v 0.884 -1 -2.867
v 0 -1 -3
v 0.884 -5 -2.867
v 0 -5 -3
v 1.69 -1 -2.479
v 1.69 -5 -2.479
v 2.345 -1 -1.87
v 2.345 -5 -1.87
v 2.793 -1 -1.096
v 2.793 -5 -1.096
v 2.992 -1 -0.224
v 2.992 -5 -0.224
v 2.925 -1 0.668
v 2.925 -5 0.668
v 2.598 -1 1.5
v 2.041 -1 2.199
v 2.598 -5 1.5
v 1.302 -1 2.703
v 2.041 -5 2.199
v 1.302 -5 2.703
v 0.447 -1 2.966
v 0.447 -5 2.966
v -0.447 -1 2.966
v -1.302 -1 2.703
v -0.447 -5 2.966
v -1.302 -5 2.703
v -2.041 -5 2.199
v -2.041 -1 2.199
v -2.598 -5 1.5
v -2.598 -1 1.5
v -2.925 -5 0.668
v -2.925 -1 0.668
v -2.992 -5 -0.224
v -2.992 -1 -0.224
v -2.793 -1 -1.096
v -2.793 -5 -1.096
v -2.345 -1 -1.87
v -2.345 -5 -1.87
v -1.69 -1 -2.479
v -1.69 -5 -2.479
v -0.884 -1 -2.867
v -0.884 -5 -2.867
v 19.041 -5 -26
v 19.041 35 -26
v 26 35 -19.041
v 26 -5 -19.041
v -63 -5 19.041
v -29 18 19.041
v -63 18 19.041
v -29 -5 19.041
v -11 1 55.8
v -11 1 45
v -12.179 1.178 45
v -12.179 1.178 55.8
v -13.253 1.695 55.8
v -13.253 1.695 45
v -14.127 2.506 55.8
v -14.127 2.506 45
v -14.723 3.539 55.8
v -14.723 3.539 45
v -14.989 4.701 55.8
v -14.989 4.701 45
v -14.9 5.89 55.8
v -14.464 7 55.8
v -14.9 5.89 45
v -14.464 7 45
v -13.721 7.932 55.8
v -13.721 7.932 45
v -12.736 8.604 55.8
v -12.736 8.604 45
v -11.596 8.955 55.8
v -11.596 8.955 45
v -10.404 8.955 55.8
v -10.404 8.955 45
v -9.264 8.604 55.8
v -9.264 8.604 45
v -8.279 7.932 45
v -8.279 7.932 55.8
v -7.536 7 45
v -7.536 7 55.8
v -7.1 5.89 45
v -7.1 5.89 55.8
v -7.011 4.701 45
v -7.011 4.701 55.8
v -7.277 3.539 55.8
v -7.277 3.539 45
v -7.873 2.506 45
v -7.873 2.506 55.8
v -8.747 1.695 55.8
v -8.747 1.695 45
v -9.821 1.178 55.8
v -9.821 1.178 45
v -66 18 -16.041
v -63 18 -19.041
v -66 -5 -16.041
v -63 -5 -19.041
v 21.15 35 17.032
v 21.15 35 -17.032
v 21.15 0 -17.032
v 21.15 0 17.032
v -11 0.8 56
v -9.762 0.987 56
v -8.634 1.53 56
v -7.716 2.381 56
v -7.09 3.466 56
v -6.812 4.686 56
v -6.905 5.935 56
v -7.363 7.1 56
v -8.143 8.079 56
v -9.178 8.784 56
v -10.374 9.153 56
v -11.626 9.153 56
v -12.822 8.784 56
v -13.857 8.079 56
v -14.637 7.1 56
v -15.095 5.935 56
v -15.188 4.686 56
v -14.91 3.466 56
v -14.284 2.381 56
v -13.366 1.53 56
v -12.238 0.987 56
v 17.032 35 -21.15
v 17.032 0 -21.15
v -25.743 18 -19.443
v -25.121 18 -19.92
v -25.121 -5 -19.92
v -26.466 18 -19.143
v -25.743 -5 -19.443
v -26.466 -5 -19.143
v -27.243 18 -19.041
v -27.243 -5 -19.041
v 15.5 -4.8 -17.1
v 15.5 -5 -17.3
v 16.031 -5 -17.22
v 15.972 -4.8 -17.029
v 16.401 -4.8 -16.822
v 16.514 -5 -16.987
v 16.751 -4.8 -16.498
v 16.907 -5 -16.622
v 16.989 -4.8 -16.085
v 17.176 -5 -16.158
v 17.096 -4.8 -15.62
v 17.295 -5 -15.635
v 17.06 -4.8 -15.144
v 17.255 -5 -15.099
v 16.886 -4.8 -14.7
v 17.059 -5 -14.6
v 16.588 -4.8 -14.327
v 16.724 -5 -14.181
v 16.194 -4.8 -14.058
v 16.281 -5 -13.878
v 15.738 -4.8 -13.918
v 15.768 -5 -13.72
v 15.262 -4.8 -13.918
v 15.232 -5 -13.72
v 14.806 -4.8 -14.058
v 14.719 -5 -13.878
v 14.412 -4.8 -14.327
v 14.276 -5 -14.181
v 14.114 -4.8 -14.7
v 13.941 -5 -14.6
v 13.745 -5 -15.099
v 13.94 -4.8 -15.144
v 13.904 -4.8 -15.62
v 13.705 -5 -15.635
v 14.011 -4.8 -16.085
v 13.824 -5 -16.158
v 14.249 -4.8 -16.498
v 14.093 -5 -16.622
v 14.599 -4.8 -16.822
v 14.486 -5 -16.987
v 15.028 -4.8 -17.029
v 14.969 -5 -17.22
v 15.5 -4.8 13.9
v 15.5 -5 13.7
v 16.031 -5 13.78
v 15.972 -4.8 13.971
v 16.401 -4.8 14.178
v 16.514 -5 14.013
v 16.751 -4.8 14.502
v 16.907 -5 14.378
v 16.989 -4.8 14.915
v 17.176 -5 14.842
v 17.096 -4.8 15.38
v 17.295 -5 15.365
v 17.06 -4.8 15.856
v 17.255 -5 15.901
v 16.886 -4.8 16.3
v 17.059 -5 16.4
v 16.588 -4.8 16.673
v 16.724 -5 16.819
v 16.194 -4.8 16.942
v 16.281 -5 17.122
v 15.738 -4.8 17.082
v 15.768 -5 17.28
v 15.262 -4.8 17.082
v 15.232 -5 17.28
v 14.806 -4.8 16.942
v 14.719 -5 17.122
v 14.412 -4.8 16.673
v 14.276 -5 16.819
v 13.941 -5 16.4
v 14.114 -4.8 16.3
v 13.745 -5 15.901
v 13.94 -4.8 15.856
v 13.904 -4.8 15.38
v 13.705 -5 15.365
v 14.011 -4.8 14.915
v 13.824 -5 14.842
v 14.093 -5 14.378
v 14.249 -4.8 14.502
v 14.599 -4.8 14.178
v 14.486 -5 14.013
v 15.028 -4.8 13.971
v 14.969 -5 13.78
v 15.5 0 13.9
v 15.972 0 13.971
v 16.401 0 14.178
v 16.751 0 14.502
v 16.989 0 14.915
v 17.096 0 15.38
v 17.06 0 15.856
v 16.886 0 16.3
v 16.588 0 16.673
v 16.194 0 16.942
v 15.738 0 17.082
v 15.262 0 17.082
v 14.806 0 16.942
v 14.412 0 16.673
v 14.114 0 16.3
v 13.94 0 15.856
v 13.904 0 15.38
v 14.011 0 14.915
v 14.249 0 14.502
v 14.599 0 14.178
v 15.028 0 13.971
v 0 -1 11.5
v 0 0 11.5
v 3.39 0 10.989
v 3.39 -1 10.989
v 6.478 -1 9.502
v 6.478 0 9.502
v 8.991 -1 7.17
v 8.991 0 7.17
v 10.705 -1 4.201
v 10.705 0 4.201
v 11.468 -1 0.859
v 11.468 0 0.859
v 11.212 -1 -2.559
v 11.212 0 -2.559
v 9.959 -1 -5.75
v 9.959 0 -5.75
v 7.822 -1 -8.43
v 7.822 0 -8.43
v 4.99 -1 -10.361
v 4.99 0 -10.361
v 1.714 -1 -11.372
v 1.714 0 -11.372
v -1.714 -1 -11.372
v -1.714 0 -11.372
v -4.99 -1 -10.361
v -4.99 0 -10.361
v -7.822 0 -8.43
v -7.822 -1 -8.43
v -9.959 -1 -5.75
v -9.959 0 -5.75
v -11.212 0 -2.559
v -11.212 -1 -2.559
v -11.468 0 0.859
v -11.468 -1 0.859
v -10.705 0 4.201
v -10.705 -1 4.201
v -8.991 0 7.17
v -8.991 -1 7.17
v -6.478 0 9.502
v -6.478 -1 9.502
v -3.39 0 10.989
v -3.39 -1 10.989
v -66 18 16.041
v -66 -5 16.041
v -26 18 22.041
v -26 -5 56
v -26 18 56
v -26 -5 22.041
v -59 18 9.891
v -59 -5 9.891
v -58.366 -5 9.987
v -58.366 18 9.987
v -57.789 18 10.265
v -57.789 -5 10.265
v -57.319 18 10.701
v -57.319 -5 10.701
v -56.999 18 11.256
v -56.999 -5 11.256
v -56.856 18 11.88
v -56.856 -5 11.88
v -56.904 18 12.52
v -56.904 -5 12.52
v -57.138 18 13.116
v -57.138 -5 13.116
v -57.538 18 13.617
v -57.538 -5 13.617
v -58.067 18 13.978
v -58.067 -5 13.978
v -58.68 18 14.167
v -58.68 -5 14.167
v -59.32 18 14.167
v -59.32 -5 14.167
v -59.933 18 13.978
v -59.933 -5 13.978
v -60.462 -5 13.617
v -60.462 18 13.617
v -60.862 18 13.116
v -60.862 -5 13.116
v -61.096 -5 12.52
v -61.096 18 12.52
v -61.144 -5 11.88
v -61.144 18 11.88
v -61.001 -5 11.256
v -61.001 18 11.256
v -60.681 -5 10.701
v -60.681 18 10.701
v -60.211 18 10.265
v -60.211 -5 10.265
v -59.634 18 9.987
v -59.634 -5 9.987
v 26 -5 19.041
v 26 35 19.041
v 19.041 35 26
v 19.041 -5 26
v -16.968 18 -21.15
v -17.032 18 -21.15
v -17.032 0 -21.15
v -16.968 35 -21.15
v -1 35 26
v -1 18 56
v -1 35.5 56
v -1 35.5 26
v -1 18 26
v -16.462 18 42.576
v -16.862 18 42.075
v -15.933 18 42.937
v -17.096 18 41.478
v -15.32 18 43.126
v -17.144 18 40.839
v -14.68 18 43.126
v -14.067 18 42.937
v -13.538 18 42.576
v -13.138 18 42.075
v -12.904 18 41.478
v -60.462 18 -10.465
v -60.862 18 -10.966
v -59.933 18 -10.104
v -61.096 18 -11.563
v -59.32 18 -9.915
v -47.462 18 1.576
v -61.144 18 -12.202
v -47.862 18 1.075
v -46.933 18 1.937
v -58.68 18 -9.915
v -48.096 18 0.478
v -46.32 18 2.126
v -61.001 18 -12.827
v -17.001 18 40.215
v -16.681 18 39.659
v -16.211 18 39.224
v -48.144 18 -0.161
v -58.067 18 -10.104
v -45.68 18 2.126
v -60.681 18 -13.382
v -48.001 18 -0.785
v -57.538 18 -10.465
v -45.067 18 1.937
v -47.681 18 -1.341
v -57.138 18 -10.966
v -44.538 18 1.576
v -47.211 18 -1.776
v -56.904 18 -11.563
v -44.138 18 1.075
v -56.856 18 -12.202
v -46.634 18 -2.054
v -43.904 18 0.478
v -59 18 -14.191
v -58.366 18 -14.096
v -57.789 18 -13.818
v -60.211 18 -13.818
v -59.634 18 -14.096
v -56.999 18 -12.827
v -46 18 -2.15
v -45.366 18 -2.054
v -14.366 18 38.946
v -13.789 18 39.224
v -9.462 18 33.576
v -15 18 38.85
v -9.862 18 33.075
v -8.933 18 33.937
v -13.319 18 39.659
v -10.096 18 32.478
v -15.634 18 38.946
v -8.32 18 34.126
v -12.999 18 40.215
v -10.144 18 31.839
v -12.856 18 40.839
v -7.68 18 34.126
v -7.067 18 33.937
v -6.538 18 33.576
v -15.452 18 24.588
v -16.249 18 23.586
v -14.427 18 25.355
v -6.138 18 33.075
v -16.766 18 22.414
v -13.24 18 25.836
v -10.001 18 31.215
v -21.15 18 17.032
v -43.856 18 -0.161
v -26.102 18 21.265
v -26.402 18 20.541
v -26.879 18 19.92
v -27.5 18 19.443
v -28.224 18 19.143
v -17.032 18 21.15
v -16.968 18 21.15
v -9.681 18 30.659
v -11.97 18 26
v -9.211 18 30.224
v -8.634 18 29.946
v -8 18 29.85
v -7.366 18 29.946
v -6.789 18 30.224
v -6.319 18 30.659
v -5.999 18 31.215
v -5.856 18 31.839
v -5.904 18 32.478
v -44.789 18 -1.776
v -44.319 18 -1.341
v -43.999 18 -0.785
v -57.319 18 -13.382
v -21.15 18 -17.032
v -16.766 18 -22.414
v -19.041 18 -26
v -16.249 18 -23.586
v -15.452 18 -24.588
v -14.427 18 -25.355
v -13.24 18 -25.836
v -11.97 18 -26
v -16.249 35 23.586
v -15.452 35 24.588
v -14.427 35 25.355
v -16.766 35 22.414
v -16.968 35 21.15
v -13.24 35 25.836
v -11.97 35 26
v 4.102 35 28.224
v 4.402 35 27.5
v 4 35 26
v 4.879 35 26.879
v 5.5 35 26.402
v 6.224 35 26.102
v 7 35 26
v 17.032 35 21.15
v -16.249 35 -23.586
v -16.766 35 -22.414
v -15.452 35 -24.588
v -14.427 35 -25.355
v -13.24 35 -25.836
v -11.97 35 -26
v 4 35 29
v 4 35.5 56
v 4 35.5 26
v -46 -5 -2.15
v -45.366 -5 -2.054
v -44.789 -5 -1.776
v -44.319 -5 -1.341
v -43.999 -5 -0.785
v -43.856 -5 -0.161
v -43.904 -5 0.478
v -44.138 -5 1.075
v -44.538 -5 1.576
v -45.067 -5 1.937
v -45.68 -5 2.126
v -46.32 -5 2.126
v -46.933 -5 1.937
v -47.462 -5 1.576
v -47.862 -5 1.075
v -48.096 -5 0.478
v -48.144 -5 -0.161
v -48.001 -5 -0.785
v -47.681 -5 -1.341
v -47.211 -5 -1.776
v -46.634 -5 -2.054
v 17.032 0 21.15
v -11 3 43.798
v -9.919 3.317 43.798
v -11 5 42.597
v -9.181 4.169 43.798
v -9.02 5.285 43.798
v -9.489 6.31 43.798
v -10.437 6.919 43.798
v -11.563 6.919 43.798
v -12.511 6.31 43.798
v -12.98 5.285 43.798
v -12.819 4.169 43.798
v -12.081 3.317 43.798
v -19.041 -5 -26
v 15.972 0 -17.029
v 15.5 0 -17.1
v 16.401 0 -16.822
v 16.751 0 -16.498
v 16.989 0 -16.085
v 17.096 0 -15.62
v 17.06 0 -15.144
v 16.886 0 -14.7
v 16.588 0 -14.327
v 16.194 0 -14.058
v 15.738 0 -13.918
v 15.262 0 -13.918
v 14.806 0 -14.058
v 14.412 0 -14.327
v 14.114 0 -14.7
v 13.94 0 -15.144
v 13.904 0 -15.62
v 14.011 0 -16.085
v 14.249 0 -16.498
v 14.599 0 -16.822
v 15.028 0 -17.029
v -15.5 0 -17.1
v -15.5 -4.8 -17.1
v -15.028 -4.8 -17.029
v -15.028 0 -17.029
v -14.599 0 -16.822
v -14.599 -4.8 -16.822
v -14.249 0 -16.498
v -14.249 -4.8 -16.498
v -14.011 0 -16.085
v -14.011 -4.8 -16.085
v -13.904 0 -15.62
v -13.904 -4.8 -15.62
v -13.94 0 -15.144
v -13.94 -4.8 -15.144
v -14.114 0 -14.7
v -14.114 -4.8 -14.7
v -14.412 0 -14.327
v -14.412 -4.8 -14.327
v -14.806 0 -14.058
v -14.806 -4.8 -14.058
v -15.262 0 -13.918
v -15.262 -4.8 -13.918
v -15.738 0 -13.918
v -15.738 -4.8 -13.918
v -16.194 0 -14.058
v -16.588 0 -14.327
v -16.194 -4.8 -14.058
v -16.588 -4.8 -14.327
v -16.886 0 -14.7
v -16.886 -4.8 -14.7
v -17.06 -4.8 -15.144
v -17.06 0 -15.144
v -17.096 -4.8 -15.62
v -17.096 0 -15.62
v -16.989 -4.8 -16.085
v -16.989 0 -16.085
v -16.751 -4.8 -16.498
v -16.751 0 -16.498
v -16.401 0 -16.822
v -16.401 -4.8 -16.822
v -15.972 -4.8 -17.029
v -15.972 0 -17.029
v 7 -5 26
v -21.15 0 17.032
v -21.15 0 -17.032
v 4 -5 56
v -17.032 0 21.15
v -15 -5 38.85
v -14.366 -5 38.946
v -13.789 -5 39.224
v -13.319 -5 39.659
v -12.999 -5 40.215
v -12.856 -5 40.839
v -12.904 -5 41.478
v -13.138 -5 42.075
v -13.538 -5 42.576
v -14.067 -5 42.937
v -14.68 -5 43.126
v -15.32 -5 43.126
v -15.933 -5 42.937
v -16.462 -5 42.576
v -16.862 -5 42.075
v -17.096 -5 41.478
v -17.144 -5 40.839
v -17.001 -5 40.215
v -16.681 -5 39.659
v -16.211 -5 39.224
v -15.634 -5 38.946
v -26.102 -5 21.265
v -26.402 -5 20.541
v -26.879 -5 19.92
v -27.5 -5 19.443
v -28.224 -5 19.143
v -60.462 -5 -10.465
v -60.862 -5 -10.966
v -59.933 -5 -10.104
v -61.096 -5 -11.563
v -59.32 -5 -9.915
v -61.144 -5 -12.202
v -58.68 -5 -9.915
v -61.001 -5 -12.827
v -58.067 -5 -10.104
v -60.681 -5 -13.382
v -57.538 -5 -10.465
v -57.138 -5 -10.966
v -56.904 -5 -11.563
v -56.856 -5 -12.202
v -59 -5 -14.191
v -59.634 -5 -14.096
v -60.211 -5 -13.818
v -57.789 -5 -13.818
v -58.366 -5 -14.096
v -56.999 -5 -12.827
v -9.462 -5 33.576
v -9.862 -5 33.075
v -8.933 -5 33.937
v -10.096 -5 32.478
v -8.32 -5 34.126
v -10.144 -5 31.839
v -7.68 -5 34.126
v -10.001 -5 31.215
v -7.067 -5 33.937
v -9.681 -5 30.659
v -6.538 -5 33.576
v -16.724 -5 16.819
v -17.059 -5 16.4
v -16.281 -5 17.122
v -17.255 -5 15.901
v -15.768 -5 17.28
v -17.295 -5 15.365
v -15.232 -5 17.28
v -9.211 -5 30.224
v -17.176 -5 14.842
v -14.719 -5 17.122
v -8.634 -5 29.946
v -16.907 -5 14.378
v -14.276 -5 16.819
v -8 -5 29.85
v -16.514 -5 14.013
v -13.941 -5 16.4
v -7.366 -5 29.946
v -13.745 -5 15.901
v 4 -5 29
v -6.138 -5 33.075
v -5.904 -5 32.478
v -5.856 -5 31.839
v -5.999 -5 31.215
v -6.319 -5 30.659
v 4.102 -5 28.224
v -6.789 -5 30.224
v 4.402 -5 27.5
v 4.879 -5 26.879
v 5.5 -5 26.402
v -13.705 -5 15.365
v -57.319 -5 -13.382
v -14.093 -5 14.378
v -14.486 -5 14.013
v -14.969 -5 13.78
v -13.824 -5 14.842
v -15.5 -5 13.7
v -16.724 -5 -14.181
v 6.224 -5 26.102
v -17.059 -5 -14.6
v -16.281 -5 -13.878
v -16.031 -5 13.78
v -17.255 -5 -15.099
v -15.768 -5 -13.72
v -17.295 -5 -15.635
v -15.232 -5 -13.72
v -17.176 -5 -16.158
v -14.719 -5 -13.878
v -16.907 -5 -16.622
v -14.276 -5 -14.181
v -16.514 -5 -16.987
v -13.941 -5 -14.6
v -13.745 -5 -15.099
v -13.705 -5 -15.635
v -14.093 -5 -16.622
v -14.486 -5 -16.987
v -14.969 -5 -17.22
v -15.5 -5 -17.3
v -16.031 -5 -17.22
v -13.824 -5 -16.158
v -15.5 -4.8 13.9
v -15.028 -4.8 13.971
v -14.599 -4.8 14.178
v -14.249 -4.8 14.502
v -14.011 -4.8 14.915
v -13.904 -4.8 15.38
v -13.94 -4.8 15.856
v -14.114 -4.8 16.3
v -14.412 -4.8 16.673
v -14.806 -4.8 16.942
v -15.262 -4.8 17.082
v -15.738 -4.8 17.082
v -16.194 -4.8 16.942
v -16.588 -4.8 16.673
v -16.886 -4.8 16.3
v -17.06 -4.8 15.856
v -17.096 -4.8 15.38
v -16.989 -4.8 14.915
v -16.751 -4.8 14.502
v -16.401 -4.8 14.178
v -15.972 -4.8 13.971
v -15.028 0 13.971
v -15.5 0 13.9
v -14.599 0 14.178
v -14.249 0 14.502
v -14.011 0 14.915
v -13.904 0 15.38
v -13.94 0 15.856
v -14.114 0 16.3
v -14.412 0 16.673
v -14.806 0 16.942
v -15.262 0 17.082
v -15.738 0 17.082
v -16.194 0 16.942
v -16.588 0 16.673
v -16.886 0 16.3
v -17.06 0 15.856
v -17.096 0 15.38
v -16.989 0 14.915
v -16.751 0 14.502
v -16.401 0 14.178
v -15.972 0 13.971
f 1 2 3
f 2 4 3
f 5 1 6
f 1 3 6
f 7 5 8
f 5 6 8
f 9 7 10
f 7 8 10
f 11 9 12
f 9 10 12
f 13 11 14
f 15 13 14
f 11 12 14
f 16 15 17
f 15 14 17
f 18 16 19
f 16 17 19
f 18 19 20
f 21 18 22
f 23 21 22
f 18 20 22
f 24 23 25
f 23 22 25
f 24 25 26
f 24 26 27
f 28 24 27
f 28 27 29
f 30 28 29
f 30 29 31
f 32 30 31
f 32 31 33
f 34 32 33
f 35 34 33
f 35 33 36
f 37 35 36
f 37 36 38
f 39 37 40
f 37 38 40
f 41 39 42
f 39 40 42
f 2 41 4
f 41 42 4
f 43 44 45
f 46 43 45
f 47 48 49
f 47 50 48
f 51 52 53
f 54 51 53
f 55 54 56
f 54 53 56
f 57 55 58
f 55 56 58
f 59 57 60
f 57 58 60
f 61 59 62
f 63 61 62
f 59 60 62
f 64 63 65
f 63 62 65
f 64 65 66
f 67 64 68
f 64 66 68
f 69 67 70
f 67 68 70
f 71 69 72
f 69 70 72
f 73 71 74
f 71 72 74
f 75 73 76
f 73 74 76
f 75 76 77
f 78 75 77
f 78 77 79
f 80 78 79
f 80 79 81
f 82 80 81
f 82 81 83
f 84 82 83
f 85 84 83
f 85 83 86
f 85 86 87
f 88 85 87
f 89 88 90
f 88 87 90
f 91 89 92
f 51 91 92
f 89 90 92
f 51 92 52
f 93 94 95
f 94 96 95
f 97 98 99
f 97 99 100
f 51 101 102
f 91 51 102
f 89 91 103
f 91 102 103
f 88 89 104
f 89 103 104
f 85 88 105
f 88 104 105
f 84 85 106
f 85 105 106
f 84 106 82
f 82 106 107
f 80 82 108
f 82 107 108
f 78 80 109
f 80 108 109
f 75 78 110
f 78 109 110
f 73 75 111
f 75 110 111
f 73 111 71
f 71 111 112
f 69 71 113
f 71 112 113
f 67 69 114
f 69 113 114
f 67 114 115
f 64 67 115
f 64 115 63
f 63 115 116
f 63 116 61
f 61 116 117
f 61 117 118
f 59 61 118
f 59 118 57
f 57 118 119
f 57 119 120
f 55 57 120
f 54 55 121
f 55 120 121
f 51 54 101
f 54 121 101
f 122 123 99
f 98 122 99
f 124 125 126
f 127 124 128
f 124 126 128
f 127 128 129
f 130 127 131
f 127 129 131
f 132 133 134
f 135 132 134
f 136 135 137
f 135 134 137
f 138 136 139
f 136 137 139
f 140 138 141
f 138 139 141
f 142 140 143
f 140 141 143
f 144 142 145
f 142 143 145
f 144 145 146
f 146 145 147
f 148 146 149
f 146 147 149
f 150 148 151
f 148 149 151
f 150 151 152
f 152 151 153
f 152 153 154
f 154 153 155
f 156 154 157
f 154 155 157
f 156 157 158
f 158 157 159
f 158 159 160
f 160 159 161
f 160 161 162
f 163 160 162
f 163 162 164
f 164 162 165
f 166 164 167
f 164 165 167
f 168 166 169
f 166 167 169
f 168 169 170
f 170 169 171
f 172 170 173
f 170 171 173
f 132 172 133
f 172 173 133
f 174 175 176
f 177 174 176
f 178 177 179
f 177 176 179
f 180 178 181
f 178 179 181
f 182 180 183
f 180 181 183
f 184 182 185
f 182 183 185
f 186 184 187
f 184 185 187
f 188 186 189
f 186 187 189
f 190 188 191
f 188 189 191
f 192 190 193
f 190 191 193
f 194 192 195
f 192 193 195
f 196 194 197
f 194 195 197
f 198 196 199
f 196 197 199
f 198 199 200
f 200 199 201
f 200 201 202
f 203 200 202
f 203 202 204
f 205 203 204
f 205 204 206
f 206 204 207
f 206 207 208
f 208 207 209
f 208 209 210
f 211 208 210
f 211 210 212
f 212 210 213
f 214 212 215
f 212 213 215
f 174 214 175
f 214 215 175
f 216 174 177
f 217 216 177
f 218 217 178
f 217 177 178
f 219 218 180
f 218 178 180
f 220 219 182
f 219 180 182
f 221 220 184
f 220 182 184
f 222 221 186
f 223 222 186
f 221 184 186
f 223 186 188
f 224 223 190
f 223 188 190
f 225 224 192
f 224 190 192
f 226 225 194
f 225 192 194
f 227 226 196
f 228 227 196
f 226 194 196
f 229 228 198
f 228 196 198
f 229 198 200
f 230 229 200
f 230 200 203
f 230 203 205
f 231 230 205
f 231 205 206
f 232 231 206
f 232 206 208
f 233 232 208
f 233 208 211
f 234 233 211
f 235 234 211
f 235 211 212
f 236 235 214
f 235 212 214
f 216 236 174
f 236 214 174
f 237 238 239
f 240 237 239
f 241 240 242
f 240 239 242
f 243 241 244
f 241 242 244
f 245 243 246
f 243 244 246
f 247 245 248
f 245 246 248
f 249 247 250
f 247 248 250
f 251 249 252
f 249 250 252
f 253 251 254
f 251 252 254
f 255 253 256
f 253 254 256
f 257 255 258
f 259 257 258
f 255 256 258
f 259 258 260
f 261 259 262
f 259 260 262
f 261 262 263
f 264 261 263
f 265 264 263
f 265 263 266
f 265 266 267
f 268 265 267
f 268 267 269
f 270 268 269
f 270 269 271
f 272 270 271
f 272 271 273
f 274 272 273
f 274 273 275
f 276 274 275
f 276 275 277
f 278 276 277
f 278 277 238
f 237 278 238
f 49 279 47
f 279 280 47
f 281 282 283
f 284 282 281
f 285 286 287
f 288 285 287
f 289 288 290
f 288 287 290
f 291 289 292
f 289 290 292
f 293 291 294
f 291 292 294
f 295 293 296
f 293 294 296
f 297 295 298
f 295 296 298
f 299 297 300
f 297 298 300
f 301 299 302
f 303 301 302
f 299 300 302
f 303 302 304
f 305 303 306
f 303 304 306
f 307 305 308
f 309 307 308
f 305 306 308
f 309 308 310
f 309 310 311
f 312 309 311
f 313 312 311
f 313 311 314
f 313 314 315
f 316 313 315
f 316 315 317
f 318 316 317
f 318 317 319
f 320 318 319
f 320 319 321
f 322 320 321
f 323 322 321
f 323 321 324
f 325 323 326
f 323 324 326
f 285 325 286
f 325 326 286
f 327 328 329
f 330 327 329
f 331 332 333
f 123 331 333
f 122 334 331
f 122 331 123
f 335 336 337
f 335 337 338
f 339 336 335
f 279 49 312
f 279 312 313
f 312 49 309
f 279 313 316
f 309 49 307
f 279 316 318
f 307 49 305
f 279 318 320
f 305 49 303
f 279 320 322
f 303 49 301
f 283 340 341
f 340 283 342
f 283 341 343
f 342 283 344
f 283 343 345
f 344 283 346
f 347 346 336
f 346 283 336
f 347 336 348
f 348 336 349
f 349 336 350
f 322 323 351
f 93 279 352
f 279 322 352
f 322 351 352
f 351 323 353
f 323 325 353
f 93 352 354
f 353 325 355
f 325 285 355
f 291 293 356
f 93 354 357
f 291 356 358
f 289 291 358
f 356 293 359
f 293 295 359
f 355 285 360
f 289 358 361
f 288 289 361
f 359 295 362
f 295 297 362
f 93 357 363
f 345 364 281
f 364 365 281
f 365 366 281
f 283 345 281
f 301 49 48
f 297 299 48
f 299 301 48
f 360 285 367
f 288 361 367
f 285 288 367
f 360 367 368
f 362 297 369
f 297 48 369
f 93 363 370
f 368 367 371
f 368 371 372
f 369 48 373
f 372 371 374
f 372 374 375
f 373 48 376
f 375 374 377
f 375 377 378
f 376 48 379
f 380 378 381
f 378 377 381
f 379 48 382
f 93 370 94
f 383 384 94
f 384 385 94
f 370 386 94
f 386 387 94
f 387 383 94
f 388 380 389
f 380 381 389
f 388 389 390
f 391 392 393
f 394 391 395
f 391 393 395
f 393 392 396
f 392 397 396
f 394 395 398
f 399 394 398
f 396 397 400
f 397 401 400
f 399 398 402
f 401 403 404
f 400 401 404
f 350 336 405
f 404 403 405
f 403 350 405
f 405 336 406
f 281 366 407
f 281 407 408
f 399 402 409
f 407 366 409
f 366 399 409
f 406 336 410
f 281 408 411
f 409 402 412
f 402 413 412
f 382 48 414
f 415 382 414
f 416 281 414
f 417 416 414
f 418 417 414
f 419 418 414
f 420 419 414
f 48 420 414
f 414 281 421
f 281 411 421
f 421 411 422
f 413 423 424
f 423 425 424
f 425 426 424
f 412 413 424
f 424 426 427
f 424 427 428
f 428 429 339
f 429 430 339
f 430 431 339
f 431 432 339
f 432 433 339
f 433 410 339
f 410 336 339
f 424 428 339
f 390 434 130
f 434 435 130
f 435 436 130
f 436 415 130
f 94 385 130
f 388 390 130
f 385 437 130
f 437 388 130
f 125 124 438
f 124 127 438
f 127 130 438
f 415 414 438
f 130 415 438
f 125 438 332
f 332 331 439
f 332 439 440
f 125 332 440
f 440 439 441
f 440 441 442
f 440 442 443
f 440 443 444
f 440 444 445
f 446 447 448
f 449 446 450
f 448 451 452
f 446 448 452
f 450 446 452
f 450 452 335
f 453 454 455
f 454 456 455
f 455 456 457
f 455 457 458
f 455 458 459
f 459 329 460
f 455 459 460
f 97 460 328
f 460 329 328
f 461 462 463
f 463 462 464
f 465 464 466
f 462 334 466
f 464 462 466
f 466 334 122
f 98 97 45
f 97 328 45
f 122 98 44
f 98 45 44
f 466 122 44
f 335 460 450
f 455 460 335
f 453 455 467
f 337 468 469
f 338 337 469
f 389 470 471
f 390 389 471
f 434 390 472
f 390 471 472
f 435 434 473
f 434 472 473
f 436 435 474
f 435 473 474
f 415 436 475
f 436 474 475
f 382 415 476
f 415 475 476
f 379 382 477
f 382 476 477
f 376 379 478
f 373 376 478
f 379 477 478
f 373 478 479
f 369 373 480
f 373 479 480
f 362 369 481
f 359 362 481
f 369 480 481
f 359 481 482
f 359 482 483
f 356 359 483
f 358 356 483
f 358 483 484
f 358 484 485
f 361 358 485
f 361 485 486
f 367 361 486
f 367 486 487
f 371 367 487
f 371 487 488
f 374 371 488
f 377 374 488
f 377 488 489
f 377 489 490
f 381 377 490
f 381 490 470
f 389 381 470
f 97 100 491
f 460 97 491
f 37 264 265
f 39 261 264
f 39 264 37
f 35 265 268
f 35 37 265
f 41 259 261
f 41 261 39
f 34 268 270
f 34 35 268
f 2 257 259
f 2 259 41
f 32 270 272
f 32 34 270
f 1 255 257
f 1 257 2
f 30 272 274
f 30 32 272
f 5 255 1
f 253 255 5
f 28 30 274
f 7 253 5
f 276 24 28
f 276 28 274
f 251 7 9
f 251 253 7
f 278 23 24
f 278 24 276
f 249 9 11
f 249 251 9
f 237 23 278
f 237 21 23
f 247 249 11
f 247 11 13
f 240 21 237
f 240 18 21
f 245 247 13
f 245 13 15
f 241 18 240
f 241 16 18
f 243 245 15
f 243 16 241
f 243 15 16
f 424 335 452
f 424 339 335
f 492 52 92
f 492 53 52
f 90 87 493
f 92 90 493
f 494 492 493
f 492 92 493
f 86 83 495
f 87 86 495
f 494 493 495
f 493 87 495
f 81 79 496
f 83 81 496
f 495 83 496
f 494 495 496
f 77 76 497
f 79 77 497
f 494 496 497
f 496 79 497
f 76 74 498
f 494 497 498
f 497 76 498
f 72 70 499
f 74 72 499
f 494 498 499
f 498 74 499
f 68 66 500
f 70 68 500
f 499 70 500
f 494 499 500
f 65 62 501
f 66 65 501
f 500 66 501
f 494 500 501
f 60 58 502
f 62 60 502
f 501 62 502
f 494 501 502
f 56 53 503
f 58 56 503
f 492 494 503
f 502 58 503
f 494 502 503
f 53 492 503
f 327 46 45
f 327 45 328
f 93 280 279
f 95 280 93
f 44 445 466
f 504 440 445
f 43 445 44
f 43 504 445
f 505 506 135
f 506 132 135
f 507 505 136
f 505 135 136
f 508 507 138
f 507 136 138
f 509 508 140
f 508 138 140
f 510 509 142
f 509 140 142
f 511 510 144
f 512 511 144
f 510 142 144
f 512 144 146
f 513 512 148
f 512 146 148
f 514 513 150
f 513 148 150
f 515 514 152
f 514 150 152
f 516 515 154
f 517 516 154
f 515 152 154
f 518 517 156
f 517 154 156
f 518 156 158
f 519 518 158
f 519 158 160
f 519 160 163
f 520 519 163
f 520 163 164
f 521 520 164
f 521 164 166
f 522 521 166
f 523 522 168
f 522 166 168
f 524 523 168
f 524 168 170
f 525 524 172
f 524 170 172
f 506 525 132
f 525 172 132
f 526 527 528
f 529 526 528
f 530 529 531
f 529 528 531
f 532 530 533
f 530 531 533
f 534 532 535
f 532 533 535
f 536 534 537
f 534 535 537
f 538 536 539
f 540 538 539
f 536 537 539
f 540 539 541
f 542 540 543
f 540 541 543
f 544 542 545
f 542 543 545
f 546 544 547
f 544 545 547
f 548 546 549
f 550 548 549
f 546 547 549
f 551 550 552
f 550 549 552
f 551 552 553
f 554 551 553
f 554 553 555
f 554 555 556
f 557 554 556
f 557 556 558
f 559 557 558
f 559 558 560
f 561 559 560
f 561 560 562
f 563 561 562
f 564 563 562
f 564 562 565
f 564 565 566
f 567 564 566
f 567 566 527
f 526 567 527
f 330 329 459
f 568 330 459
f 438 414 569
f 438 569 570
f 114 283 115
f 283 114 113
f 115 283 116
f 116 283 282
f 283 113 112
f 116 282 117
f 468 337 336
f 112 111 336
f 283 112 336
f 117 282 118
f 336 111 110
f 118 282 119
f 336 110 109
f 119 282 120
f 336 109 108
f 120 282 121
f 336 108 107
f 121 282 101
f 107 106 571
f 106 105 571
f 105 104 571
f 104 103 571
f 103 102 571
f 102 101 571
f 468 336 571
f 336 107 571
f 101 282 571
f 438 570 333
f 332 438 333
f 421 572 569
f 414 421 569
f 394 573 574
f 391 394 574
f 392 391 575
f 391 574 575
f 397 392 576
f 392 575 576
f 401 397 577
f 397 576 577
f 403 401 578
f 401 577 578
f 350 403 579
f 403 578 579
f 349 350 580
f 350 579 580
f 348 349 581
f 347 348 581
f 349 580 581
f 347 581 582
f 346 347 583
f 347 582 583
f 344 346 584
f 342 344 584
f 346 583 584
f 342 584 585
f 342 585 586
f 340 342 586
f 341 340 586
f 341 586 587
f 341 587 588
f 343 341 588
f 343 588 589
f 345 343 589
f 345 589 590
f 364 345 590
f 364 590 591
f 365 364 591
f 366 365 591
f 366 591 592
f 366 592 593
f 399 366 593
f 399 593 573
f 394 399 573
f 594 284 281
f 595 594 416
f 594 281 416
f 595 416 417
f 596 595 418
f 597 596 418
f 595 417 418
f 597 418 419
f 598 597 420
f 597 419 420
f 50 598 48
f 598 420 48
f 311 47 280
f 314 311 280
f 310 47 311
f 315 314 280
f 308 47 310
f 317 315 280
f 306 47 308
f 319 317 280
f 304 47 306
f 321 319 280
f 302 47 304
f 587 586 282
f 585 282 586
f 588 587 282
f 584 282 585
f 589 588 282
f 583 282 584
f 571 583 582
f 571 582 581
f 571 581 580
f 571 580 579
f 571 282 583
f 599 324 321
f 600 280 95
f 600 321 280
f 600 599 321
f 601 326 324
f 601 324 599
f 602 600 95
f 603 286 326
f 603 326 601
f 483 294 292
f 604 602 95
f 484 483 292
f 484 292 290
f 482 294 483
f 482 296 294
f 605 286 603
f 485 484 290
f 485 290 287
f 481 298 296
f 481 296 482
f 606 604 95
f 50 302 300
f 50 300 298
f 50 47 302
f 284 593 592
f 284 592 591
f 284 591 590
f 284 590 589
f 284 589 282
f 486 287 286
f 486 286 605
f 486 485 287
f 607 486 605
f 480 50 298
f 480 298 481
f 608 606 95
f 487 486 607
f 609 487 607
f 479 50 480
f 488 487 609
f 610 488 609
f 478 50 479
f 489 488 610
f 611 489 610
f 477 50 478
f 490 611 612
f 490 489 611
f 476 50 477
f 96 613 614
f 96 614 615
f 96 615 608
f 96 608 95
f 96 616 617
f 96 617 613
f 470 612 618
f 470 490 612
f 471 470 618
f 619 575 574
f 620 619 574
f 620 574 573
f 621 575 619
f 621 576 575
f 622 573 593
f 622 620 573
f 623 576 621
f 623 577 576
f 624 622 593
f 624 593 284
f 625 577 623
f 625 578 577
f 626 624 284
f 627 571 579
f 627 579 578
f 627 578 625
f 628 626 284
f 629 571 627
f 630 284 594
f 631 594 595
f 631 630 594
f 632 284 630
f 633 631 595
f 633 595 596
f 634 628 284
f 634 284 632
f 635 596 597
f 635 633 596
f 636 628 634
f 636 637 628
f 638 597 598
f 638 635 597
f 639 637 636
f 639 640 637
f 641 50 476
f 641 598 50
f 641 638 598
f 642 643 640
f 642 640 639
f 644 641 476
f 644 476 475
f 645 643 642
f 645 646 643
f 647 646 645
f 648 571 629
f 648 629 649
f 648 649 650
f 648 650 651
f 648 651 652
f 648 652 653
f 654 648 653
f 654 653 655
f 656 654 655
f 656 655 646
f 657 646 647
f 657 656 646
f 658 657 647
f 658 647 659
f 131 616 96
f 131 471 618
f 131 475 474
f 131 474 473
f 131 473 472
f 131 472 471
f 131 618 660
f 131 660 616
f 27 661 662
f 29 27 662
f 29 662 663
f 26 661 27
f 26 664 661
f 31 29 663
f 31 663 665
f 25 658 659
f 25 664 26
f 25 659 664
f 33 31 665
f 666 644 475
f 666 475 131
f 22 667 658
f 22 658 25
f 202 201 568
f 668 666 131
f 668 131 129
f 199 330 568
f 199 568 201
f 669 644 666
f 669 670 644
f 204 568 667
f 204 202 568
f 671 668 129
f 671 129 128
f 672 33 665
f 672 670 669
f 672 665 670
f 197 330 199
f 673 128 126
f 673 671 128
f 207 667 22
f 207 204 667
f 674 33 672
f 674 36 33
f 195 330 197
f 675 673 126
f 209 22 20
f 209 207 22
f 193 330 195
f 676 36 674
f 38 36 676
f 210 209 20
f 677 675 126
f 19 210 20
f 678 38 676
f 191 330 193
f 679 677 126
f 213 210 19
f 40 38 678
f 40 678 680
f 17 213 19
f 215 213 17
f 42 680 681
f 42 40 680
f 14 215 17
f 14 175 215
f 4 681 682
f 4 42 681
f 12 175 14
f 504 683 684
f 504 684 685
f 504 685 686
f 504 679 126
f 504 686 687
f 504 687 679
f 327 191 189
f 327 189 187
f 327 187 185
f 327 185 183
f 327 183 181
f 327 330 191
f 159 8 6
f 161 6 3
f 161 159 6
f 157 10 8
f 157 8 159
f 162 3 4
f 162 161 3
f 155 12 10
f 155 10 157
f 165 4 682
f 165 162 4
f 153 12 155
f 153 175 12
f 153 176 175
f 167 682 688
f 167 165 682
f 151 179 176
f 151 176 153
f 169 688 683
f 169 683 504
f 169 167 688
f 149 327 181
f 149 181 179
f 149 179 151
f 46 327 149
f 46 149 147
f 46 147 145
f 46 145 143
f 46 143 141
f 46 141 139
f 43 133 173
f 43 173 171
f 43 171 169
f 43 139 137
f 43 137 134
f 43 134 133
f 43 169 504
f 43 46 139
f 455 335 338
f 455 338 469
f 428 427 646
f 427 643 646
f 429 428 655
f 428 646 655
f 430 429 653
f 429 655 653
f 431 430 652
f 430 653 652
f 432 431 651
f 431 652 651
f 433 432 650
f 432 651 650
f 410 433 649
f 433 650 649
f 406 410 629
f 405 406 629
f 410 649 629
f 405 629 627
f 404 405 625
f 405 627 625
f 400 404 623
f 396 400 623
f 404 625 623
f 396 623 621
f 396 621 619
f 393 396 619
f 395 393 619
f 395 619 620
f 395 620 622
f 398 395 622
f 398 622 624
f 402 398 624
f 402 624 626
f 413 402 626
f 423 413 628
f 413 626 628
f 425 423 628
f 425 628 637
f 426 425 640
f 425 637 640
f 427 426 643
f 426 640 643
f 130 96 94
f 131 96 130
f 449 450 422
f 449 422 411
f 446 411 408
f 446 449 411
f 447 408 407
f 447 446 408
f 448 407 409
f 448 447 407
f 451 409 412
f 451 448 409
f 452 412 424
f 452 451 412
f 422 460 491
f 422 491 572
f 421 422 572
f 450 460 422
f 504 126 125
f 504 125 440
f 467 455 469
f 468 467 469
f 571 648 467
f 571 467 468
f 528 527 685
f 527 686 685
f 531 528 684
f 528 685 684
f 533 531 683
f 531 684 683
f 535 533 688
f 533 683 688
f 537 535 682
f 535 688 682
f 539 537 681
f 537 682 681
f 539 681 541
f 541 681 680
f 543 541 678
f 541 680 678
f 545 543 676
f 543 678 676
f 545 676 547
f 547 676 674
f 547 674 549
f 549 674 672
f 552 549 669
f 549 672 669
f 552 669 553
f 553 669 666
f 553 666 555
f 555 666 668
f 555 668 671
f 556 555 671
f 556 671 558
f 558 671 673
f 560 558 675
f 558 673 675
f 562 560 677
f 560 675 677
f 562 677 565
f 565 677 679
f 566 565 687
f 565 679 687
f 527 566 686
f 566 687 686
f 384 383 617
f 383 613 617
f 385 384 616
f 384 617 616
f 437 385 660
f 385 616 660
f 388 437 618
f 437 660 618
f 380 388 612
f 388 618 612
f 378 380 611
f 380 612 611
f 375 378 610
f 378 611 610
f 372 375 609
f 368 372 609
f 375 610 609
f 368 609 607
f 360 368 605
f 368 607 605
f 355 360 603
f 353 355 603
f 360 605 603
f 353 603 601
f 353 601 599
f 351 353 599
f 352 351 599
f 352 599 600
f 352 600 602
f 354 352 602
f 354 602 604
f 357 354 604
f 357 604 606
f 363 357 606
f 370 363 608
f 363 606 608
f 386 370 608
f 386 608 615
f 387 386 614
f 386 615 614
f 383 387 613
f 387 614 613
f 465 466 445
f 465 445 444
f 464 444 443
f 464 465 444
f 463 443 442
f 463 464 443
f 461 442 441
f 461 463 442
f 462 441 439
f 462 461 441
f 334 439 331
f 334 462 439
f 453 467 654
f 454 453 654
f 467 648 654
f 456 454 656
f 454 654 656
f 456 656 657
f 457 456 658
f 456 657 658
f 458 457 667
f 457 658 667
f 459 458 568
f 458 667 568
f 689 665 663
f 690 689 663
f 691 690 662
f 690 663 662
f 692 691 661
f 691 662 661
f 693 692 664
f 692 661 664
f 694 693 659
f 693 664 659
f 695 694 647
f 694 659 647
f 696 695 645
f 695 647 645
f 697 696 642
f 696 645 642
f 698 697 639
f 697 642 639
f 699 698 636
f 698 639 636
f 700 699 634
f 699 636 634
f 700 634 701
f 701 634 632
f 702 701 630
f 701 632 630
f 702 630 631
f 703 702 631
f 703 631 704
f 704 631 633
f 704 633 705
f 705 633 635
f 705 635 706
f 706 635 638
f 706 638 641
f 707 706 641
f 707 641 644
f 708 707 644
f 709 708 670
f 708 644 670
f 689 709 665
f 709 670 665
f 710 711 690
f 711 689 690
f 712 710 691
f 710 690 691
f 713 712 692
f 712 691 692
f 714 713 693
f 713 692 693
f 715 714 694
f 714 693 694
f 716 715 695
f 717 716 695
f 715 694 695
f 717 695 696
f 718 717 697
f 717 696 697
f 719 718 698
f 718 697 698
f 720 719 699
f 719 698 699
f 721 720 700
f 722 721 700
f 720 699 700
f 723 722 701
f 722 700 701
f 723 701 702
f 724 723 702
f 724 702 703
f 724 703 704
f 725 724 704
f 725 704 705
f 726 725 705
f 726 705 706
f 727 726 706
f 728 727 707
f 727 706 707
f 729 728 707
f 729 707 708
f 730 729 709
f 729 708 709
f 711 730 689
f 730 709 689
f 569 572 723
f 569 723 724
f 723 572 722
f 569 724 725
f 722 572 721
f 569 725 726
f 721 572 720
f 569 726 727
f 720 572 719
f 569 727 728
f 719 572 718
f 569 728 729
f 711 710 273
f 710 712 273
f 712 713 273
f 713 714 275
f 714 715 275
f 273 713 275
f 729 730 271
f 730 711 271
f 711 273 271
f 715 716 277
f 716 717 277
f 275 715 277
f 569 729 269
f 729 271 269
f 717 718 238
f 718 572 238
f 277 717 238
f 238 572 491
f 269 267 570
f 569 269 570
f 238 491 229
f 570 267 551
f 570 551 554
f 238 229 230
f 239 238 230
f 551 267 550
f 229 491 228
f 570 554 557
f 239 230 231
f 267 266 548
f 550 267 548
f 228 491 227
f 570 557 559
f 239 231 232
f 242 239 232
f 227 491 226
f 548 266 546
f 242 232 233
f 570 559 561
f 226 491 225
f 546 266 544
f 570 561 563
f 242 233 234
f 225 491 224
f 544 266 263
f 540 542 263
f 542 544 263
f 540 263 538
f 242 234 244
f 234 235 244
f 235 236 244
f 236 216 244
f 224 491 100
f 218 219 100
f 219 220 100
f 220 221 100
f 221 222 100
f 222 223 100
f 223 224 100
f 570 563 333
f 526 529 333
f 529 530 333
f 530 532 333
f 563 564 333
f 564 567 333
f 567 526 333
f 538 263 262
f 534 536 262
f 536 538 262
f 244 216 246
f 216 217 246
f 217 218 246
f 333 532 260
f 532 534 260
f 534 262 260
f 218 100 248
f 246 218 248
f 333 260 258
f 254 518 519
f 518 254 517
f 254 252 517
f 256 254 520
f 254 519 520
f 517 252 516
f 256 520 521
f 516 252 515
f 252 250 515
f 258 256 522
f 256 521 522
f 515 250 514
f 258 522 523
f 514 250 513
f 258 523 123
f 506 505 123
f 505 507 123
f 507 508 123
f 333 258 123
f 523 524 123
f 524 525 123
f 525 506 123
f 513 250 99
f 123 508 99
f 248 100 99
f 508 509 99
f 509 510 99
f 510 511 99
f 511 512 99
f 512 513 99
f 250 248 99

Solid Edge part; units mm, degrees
sketch "Sketch1" plane through (0, 0, 0) normal (0, -1, 0) x (1, 0, 0)
  line L0 (21, 16.97) -> (16.97, 21)
  line L1 (16.97, 21) -> (-16.97, 21)
  line L2 (-16.97, 21) -> (-21, 16.97)
  line L3 (-21, 16.97) -> (-21, -16.97)
  line L4 (-21, -16.97) -> (-16.97, -21)
  line L5 (-16.97, -21) -> (16.97, -21)
  line L6 (16.97, -21) -> (21, -16.97)
  line L7 (21, -16.97) -> (21, 16.97)
  line L8 (26, 19.0411) -> (19.0411, 26)
  line L9 (19.0411, 26) -> (-19.0411, 26)
  line L10 (-19.0411, 26) -> (-26, 19.0411)
  line L11 (-26, 19.0411) -> (-26, -19.0411)
  line L12 (-26, -19.0411) -> (-19.0411, -26)
  line L13 (-19.0411, -26) -> (19.0411, -26)
  line L14 (19.0411, -26) -> (26, -19.0411)
  line L15 (26, -19.0411) -> (26, 19.0411)
  dimension "D1" = 33.94
  dimension "D2" = 33.94
  dimension "D3" = 33.94
  dimension "D4" = 33.94
  dimension "D5" = 42
  dimension "D6" = 42
  dimension "D7" = 21
  dimension "D8" = 5
extrude "Protrusion1" add sketch "Sketch1" against normal blind 35
sketch "Sketch2" plane through (0, 0, 0) normal (0, -1, 0) x (1, 0, 0)
  line L0 (19.0411, 26) -> (-19.0411, 26)
  line L1 (-19.0411, 26) -> (-26, 19.0411)
  line L2 (-26, 19.0411) -> (-26, -19.0411)
  line L3 (-26, -19.0411) -> (-19.0411, -26)
  line L4 (-19.0411, -26) -> (19.0411, -26)
  line L5 (19.0411, -26) -> (26, -19.0411)
  line L6 (26, -19.0411) -> (26, 19.0411)
  line L7 (26, 19.0411) -> (19.0411, 26)
extrude "Deckel" add sketch "Sketch2" along normal blind 5
hole "Motorwelle" at (0, -5, 0) direction (0, 1, 0) diameter 6 end up to next
hole "Hole1" at (-15.5, -5, -15.5) direction (0, 1, 0) diameter 3.2 end up to next start chamfer 0.2 start chamfer angle 45
hole "Hole2" at (-15.5, -5, 15.5) direction (0, 1, 0) diameter 3.2 end up to next start chamfer 0.2 start chamfer angle 45
hole "Hole3" at (15.5, -5, 15.5) direction (0, 1, 0) diameter 3.2 end up to next start chamfer 0.2 start chamfer angle 45
hole "Hole4" at (15.5, -5, -15.5) direction (0, 1, 0) diameter 3.2 end up to next start chamfer 0.2 start chamfer angle 45
sketch "Sketch3" plane through (0, 0, 0) normal (0, 1, 0) x (0, 0, 1)
  circle A0 centre (0, 0) radius 11.5
  dimension "D1" = 23
extrude "Motoflansch" cut sketch "Sketch3" against normal blind 1
sketch "Sketch4" plane through (0, -5, 0) normal (0, -1, 0) x (1, 0, 0)
  line L0 (-26, 19.0411) -> (-19.0411, 26)
  line L1 (-19.0411, 26) -> (4, 26)
  line L2 (4, 26) -> (4, 56)
  line L3 (-26, 56) -> (4, 56)
  line L4 (-26, 19.0411) -> (-26, 56)
  dimension "D1" = 30
  dimension "D2" = 30
extrude "Motoraufhängung_Leiste" add sketch "Sketch4" against normal blind 23
sketch "Sketch5" plane through (-13, 18, 33.5205) normal (0, 1, 0) x (-1, 0, 0)
  line L0 (-17, -7.5205) -> (-17, 22.4795)
  line L1 (-17, 22.4795) -> (-12, 22.4795)
  line L2 (-12, 22.4795) -> (-12, -7.5205)
  line L3 (-12, -7.5205) -> (-17, -7.5205)
  dimension "D1" = 5
extrude "Zentrierung_Leiste" add sketch "Sketch5" along normal blind 17.5
sketch "Sketch6" plane through (0, -5, 11) normal (0, -1, 0) x (1, 0, 0)
  line L0 (-26, -30.0411) -> (-26, 8.0411)
  line L1 (-26, 8.0411) -> (-63, 8.0411)
  line L2 (-66, 5.0411) -> (-63, 8.0411)
  line L3 (-66, 5.0411) -> (-66, -27.0411)
  line L4 (-63, -30.0411) -> (-66, -27.0411)
  line L5 (-63, -30.0411) -> (-26, -30.0411)
  dimension "D1" = 3
  dimension "D2" = 3
  dimension "D3" = 40
extrude "Auflage_auf_Platte" add sketch "Sketch6" against normal blind 23
hole "Bohrung_Alustange" at (-11, 5, 56) direction (0, 0, -1) diameter 8 depth 11 tip angle 118 start chamfer 0.2 start chamfer angle 45
sketch "Sketch7" plane through (0, 35, 0) normal (0, 1, 0) x (1, 0, 0)
  line L0 (-19.0411, 26) -> (-16.97, 21)
  line L1 (-16.97, 21) -> (-16.97, -21)
  line L2 (-16.97, -21) -> (-19.0411, -26)
  line L3 (-19.0411, -26) -> (-26, -26)
  line L4 (-26, -26) -> (-26, 26)
  line L5 (-26, 26) -> (-19.0411, 26)
extrude "Motorseite" cut sketch "Sketch7" against normal blind 17
hole "Hole5" at (-8, -5, 32) direction (0, 1, 0) diameter 4.3 end up to next
hole "Hole6" at (-15, -5, 41) direction (0, 1, 0) diameter 4.3 end up to next
hole "Hole7" at (-59, -5, 12.0411) direction (0, 1, 0) diameter 4.3 end up to next
hole "Hole8" at (-59, -5, -12.0411) direction (0, 1, 0) diameter 4.3 end up to next
hole "Hole9" at (-46, -5, 0) direction (0, 1, 0) diameter 4.3 end up to next
fillet "Verrundung_Innen" radius 3 3 edges at (-26, 6.5, -19.0411) (-26, 6.5, 19.0411) (4, 15, 26)
fillet "Verrundung_spitzeEcke" radius 5 2 edges at (-19.0411, 26.5, 26) (-19.0411, 26.5, -26)
sketch "Sketch8" plane through (4.515, 35, 1.5) normal (0, 1, 0) x (0, 0, -1)
  line L0 (-15.5321, 25.665) -> (18.5321, 25.665)
  line L1 (18.5321, 25.665) -> (22.65, 21.5471)
  line L2 (22.65, 21.5471) -> (22.65, -12.5171)
  line L3 (22.65, -12.5171) -> (18.5321, -16.635)
  line L4 (18.5321, -16.635) -> (-15.5321, -16.635)
  line L5 (-15.5321, -16.635) -> (-19.65, -12.5171)
  line L6 (-19.65, -12.5171) -> (-19.65, 21.5471)
  line L7 (-19.65, 21.5471) -> (-15.5321, 25.665)
extrude "Verbreiterung" cut sketch "Sketch8" against normal blind 35
